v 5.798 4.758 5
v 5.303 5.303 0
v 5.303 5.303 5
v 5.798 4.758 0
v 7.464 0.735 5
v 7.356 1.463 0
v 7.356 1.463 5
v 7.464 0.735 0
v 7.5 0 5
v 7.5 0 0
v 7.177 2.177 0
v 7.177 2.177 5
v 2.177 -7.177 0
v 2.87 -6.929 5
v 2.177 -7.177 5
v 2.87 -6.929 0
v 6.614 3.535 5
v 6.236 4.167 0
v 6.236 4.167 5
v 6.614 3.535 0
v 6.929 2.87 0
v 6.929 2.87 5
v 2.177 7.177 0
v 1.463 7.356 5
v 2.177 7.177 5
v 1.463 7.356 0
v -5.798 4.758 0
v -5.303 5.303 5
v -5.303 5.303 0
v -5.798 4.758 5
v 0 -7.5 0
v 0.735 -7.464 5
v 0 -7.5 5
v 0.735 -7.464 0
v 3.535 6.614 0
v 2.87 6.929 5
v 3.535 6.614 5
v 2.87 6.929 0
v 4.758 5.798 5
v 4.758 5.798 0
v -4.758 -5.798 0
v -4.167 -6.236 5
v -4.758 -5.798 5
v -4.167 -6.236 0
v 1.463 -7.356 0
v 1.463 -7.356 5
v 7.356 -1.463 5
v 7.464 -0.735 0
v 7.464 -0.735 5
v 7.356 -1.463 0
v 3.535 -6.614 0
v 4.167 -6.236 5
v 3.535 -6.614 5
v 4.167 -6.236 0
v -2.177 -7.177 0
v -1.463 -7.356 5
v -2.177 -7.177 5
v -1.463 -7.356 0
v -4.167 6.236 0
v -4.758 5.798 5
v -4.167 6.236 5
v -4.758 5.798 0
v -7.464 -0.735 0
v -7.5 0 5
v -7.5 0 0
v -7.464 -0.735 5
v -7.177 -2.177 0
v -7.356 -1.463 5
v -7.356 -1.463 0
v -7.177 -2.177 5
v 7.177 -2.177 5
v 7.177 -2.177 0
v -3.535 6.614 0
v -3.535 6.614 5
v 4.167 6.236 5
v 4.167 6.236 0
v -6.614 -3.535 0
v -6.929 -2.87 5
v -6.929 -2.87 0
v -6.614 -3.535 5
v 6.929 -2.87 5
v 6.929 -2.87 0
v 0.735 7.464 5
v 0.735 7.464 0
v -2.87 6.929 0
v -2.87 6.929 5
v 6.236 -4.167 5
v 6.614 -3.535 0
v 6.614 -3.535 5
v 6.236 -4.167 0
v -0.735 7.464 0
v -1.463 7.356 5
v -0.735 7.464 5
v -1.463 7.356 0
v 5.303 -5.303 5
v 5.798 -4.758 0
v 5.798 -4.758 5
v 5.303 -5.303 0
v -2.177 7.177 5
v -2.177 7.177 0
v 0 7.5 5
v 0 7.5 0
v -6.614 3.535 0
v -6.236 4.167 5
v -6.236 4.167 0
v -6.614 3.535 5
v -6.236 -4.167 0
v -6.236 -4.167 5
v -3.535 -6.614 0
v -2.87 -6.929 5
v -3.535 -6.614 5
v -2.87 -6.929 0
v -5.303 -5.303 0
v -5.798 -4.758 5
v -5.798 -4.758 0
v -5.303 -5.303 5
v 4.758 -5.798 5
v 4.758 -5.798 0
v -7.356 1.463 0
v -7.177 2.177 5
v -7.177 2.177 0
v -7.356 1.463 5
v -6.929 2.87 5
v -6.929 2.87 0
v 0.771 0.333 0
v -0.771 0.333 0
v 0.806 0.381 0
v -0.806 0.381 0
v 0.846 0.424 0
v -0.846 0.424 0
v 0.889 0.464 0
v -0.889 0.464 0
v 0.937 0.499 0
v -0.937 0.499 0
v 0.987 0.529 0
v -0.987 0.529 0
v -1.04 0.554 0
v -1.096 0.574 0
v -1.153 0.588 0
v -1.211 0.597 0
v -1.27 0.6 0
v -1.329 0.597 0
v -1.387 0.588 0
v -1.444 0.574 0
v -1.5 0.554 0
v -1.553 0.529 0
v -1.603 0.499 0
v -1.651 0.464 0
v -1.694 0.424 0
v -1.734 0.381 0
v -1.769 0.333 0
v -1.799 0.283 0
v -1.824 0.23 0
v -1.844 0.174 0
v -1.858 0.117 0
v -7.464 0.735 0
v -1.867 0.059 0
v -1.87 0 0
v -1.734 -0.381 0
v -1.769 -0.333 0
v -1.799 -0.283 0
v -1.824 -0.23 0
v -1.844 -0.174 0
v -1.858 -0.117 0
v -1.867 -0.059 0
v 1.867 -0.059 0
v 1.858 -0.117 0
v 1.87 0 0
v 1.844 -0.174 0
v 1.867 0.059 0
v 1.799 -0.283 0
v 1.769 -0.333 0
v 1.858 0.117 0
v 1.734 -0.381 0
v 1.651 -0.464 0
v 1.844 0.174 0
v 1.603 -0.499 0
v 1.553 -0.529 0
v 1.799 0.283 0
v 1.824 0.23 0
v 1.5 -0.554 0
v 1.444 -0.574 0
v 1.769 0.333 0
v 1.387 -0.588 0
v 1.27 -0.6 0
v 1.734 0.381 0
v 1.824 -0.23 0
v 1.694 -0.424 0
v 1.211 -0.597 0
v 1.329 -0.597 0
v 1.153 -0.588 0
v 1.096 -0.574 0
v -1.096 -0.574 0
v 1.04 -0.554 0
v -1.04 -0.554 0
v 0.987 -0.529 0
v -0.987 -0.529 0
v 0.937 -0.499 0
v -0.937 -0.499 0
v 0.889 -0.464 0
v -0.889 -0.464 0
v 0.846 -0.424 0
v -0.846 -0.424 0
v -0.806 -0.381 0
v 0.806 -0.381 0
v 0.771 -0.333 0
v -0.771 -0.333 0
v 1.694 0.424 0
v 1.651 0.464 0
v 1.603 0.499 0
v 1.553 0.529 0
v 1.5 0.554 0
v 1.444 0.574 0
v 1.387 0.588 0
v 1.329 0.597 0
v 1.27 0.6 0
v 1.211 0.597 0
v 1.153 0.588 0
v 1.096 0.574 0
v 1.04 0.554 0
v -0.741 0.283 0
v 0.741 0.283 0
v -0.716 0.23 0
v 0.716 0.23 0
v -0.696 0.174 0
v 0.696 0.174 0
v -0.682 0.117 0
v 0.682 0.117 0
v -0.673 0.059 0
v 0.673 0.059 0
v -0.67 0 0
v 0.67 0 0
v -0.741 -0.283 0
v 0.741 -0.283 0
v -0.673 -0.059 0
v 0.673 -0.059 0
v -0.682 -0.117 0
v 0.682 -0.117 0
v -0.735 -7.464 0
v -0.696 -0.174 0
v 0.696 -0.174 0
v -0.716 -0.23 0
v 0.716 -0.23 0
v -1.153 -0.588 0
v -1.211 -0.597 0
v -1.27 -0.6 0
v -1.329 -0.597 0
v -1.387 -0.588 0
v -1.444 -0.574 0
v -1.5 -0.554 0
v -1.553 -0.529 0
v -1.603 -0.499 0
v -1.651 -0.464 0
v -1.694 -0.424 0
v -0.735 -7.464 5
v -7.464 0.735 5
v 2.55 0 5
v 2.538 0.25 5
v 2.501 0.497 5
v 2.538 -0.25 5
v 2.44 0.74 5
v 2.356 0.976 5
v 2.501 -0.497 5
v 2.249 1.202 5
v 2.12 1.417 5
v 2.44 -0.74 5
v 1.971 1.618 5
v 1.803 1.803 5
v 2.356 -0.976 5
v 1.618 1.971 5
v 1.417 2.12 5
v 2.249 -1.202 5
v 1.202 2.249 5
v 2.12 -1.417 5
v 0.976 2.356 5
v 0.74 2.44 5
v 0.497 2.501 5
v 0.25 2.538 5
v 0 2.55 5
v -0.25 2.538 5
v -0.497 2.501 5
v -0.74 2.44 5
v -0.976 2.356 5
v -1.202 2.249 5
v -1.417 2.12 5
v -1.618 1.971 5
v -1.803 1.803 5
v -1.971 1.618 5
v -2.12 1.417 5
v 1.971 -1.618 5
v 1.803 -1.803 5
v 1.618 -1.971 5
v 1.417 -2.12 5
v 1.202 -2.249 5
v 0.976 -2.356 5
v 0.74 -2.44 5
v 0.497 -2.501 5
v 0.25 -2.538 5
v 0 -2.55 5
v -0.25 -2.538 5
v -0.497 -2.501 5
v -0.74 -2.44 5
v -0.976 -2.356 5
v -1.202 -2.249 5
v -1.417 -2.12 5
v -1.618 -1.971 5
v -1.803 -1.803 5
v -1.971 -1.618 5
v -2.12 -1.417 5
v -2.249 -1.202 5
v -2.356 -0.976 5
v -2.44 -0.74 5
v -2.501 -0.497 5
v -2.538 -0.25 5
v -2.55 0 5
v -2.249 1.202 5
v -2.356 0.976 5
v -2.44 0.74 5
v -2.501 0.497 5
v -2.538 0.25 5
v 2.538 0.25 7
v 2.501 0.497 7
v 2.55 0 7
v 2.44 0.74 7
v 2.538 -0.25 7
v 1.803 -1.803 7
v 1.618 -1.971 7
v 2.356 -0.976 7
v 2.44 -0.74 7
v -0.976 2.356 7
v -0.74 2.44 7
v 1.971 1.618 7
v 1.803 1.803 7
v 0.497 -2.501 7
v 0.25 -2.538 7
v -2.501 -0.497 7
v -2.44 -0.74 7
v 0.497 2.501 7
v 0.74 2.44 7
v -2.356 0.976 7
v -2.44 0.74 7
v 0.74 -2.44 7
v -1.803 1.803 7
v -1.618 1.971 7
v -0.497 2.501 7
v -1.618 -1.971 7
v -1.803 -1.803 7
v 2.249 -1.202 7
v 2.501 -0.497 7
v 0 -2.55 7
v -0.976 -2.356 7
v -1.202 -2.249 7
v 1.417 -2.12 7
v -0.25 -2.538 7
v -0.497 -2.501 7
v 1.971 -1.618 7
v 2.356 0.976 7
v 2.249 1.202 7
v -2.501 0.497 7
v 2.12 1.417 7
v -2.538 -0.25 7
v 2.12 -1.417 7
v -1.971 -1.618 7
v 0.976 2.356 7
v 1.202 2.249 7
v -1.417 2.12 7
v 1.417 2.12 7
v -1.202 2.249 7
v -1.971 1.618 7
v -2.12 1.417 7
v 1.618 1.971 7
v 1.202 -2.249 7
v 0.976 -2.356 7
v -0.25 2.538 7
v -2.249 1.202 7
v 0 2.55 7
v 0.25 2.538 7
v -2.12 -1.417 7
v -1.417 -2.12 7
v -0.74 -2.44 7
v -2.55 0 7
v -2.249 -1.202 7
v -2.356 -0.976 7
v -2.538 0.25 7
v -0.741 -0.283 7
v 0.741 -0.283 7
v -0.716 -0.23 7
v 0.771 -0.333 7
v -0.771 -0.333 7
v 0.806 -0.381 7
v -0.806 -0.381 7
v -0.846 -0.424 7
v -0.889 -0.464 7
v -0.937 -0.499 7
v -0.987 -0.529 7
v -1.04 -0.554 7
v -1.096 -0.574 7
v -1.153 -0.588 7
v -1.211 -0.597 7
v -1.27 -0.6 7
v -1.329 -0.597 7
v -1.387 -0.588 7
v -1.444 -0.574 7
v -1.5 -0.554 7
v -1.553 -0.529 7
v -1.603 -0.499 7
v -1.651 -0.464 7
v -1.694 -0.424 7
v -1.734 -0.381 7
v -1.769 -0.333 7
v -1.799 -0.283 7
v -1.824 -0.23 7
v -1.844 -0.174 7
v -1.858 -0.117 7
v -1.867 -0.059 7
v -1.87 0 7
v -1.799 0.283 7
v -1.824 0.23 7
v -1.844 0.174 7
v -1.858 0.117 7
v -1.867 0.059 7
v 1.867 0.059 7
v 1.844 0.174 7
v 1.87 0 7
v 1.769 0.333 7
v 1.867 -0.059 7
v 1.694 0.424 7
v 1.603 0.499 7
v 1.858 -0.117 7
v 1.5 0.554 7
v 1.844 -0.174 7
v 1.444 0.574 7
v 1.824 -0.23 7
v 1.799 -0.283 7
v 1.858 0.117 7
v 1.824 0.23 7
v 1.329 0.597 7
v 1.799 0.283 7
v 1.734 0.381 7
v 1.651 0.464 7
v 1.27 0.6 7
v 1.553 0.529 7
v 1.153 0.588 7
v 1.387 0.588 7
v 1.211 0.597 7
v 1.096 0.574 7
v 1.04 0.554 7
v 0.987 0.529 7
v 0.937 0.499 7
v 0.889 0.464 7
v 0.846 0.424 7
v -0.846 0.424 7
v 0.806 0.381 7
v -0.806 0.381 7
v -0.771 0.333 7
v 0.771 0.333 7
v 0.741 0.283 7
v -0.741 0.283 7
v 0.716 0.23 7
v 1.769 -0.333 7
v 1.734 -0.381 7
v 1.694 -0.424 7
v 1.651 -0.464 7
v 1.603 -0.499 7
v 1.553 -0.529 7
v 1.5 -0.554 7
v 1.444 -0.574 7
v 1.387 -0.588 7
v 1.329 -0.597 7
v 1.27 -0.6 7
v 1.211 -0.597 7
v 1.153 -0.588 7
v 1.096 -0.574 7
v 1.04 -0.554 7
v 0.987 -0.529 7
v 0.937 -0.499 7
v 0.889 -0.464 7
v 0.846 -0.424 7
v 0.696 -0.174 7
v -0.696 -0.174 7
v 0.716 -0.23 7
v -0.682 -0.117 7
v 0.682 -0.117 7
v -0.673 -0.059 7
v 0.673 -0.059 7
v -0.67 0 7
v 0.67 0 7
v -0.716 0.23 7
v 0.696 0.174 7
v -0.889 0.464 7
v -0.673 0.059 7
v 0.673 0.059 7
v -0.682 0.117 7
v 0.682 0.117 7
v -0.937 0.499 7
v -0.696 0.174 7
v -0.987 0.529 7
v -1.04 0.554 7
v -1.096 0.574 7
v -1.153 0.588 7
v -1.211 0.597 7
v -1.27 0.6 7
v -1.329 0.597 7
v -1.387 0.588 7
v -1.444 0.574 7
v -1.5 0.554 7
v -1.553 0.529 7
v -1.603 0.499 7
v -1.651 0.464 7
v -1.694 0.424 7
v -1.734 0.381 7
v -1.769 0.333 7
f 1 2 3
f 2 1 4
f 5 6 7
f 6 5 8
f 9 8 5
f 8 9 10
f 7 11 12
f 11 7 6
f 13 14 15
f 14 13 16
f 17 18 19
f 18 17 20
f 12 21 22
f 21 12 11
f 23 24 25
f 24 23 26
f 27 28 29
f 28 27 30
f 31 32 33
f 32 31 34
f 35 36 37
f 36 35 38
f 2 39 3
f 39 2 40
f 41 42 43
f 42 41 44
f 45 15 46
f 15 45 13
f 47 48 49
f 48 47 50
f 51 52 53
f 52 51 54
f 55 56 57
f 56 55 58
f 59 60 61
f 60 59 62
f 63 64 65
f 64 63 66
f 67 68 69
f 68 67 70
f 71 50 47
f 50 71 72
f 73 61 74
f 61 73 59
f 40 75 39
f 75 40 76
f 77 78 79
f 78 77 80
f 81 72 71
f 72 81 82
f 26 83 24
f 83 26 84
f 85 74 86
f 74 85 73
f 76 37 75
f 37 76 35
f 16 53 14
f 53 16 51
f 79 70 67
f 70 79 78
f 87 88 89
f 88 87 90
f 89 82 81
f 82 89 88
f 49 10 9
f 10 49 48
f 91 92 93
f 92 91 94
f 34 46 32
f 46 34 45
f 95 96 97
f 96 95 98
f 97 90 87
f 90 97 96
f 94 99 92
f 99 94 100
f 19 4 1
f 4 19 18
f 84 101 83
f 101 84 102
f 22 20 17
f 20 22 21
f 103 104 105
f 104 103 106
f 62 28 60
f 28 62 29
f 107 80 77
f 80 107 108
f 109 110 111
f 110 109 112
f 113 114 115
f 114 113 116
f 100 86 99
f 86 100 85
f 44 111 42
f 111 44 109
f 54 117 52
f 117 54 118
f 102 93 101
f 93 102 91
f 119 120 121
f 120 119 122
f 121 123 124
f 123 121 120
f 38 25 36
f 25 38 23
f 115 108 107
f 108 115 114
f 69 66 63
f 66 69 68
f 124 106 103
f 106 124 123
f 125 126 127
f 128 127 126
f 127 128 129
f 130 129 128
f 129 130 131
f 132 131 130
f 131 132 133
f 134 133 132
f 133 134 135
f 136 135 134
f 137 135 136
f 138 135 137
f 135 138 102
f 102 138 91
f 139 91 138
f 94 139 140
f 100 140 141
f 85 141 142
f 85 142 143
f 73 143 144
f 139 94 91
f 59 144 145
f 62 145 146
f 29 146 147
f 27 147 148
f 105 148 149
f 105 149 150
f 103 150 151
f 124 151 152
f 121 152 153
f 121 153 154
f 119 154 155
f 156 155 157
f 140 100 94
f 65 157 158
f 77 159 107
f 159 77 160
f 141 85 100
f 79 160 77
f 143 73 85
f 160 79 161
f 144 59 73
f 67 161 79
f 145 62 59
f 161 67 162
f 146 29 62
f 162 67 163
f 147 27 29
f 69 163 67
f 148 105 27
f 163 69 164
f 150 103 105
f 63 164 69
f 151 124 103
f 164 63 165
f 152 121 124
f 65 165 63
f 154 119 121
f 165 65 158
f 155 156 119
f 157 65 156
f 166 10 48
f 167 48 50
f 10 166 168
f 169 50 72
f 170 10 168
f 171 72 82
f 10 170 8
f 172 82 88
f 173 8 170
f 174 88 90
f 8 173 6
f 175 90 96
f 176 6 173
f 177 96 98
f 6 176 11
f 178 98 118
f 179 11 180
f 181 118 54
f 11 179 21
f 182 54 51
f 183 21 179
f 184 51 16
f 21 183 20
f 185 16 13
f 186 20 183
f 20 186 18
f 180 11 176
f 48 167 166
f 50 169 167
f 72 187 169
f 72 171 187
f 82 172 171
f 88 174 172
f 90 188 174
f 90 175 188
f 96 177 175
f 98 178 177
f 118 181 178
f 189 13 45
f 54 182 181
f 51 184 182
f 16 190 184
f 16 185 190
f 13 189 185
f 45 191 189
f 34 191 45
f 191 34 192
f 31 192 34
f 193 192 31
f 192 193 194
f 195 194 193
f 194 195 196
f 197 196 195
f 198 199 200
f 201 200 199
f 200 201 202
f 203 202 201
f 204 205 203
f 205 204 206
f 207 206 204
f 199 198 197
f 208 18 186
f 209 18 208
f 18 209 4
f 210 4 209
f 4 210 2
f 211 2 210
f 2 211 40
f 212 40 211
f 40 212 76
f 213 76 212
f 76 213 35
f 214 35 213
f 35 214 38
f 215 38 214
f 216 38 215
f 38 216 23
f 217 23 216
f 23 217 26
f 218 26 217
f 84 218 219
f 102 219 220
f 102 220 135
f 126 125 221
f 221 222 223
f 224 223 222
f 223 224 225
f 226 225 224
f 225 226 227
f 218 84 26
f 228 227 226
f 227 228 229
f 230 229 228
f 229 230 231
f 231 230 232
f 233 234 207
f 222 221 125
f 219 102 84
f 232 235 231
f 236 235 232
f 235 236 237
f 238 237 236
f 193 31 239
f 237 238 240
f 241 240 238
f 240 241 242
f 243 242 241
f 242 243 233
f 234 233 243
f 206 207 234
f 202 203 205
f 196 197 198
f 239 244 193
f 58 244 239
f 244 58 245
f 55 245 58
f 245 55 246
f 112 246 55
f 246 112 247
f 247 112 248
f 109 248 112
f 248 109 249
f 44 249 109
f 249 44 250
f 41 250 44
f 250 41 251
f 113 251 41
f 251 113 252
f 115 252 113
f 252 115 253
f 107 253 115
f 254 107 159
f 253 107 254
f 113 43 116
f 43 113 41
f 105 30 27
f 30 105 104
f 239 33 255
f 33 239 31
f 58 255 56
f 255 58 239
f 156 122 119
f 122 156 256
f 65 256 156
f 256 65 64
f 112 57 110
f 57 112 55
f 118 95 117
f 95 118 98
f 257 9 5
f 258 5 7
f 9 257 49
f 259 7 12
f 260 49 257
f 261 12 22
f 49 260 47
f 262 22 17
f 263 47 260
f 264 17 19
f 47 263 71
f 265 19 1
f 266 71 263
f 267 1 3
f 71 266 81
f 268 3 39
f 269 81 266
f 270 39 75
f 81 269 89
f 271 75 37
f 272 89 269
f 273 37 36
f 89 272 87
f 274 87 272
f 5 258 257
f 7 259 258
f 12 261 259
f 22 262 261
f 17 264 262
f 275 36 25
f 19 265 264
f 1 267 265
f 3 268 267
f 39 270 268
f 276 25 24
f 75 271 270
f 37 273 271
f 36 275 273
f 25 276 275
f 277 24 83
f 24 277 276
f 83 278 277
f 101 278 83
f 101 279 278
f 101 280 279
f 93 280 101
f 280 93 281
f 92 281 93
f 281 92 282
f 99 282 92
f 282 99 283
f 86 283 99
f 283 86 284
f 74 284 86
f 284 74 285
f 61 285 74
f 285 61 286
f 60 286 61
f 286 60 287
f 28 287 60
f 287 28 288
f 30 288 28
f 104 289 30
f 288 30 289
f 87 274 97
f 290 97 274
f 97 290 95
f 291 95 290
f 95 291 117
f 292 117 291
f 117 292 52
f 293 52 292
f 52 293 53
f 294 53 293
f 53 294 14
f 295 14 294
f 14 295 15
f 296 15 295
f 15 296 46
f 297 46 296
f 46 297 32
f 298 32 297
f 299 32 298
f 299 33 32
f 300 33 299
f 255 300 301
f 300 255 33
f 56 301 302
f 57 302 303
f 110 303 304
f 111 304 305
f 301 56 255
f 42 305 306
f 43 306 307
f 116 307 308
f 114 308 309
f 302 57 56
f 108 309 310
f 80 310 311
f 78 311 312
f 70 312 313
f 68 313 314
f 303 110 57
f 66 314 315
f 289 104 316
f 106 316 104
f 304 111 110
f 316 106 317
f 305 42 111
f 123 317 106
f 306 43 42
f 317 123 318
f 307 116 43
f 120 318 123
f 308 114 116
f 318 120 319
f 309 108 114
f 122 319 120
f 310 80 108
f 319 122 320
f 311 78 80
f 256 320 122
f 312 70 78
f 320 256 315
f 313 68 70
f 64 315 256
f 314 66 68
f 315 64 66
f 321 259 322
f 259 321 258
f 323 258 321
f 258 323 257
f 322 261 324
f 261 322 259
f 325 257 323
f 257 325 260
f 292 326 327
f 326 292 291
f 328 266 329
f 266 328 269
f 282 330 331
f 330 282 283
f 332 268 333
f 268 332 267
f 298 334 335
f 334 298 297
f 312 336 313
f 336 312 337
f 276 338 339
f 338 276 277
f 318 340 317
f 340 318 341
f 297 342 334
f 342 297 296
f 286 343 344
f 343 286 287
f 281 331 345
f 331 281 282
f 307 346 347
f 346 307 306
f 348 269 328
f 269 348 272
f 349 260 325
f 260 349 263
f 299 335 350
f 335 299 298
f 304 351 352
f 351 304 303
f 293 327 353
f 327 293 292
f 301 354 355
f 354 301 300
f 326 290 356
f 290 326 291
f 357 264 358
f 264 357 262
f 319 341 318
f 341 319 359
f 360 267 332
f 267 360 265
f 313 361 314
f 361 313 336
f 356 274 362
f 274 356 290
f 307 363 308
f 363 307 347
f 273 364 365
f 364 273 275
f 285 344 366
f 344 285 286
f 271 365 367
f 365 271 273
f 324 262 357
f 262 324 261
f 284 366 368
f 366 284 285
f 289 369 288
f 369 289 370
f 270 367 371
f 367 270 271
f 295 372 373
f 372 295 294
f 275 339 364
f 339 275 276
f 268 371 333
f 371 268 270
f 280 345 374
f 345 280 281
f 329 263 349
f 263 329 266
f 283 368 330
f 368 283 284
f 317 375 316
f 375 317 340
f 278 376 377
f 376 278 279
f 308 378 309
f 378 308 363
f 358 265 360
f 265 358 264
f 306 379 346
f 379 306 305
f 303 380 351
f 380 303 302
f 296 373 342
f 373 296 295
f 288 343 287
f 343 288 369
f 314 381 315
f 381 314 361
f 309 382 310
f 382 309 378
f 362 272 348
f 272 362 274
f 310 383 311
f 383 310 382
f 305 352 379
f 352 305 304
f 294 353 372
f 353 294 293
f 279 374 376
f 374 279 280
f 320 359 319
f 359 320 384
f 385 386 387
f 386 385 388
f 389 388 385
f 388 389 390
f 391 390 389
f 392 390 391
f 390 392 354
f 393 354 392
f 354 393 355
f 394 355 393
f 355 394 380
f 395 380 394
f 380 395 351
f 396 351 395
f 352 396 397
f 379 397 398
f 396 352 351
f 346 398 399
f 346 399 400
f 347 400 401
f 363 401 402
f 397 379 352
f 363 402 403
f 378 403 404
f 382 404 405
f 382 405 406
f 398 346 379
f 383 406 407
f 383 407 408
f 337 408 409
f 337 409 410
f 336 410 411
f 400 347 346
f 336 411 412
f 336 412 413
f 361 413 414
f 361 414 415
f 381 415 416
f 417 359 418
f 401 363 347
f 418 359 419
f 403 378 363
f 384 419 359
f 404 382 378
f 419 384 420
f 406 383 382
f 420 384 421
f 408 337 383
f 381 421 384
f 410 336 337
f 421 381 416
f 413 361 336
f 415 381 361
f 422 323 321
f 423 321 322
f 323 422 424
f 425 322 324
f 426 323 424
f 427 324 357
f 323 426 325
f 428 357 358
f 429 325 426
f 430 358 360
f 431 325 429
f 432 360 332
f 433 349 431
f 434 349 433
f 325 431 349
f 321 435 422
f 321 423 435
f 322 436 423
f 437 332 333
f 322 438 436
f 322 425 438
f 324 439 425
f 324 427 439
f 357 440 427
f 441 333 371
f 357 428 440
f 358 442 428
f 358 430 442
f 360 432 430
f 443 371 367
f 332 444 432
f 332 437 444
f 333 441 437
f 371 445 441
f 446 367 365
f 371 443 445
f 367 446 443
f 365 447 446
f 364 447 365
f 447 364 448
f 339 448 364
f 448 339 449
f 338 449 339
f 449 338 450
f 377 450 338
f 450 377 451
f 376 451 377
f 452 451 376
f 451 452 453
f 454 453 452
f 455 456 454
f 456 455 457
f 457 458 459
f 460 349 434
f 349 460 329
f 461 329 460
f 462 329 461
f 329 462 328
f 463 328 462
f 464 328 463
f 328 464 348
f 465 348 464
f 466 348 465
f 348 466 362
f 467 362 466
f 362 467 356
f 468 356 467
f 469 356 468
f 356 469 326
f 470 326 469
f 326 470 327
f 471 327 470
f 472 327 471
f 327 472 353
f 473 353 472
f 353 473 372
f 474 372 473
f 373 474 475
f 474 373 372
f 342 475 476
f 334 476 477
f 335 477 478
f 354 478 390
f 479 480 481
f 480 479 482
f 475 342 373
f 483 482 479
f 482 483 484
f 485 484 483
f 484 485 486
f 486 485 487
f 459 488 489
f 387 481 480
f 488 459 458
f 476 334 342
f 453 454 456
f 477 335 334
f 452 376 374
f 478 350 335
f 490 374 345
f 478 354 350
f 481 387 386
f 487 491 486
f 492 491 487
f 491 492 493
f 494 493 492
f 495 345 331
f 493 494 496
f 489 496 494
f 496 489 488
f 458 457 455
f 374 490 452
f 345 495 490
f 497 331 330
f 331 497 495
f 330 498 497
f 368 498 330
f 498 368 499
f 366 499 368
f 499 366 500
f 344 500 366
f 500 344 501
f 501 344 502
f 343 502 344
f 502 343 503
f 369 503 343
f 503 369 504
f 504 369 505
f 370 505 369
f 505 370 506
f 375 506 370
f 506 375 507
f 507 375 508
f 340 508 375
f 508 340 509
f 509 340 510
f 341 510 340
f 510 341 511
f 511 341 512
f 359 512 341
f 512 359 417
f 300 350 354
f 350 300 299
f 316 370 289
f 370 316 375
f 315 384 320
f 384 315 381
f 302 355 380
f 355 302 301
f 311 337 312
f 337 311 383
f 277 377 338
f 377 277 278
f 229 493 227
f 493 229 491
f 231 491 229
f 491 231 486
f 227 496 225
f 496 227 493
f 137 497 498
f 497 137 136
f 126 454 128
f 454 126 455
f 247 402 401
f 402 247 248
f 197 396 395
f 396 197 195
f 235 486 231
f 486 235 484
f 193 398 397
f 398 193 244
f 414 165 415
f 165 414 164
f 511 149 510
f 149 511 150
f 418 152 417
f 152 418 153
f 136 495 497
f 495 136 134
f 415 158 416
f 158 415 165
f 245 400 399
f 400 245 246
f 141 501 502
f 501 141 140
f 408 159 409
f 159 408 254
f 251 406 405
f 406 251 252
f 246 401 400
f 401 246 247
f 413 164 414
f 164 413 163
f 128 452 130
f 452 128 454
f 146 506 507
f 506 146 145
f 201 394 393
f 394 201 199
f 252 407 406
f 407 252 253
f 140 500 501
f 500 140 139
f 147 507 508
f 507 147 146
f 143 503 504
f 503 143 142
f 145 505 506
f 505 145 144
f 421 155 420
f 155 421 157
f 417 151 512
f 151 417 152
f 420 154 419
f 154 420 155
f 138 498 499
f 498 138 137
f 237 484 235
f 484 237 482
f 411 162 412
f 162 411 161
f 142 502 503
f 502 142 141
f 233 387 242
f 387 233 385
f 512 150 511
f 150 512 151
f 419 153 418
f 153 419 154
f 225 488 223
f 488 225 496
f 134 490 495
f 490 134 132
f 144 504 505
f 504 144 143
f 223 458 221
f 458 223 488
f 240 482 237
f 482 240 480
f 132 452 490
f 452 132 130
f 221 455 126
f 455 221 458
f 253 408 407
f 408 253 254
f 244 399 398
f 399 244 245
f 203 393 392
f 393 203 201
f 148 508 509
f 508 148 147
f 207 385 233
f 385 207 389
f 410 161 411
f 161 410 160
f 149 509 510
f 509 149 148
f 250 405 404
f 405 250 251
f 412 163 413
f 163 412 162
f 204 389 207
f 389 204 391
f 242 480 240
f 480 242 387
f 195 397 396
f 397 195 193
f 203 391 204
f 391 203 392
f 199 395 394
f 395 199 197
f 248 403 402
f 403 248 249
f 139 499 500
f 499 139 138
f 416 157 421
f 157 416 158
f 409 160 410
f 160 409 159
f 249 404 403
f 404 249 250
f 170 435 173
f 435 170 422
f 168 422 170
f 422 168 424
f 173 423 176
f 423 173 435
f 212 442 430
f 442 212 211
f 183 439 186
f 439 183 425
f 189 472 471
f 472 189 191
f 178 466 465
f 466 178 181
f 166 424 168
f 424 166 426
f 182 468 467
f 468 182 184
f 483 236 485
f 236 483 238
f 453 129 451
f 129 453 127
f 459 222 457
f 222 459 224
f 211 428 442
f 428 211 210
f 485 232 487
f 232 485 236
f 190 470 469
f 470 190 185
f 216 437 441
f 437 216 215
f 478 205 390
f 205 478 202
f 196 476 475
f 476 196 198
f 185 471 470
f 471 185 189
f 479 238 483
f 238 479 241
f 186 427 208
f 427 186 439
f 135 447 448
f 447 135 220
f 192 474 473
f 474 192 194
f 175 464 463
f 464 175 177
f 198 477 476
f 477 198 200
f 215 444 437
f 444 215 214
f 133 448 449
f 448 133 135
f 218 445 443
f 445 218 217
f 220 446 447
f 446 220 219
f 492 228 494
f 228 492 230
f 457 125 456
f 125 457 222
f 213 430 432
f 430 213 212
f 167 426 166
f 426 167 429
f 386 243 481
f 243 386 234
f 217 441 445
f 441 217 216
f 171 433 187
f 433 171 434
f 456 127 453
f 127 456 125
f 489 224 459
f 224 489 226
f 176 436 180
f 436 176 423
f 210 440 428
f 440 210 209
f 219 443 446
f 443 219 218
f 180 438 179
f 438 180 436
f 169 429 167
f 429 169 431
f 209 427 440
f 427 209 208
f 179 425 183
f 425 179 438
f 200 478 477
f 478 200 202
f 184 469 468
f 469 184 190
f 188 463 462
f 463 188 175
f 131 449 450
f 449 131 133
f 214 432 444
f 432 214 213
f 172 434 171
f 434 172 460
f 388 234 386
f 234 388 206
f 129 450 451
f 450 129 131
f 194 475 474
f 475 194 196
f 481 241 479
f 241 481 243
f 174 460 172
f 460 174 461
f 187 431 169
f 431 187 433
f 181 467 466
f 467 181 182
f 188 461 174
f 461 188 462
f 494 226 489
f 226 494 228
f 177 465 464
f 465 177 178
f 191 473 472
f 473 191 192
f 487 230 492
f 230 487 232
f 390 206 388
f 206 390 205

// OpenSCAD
// file: params.scad
// ============================================
// fiberfeel-rig 共通パラメータ
// ============================================

// --- ファイバー ---
// 三菱レイヨン エスカ CK-40E1 (PMMA SI POF, 1.0mm OD)
pof_diameter_mm = 1.0;
pof_clearance_mm = 0.2;                       // 印刷誤差吸収
pof_channel_width_mm = pof_diameter_mm + pof_clearance_mm;
pof_channel_depth_mm = pof_diameter_mm * 0.7; // 上面はゲル接触可能に

// --- LED カプラ専用：縦穴の収縮余裕 ---
pof_channel_width_led_side_mm = 1.8;  // 縦穴専用、収縮余裕大（実機検証で 1.5 → 1.8 に拡大）

// --- 曲げ半径 ---
bend_radius_mm = 10.0;
bend_straight_run_mm = 30;                    // 曲げ部前後の直線部長さ

// --- LED ---
led_diameter_mm = 5.1;                        // 5mm砲弾型 + クリアランス
led_body_depth_mm = 8.0;                      // LED本体（リード除く）の埋め込み深さ
led_lead_clearance_mm = 5.0;                  // リード逃げの空間

// --- LED back cap（led_fiber_coupler の LED 側穴を密閉する遮光蓋）---
led_back_cap_diameter_mm           = 15.0;    // led_fiber_coupler 外径と同じ
led_back_cap_thickness_mm          = 5.0;     // 円盤厚
led_back_cap_lead_hole_diameter_mm = 1.2;     // LED リード線通し穴
led_back_cap_lead_hole_pitch_mm    = 2.54;    // 標準 0.1" ピッチ
led_back_cap_press_fit_diameter_mm = 5.1;     // led_fiber_coupler の LED 穴と同径
led_back_cap_press_fit_depth_mm    = 2.0;     // 圧入突起の高さ

// --- ゲル/PDMS パッド ---
pad_size_mm = 30;                             // 30 x 30 mm
pad_thickness_mm = 3;                         // 3 mm 厚
mold_wall_mm = 4;
mold_floor_mm = 3;
mold_taper_deg = 1;                           // 抜き勾配

// --- 錘ガイド ---
weight_pad_outer_mm = 35;
weight_recess_diameter_mm = 25;
weight_recess_depth_mm = 5;

// --- カメラカプラ ---
// Pi HQ Camera M12 ボディ寸法
hq_body_width_mm = 38;
hq_body_height_mm = 38;
hq_body_depth_mm = 19;
camera_to_fiber_distance_mm = 70;             // 暫定、Phase 0 で調整
fiber_arm_slot_length_mm = 40;                // ±20mm の調整代

// --- HQ Camera 取り付け穴 ---
// Robosheep 実機合わせ：30×30mm 正方ピッチ、M2.5 通し穴 d=3.1（印刷収縮余裕込み）
hq_mount_pitch_mm = 30.0;       // M2.5 穴の縦・横ピッチ（実測値）
hq_mount_hole_d_mm = 3.1;       // M2.5 通し穴径（クリアランス＋印刷収縮余裕込み）
hq_mount_offset_mm = 6.25;      // PCB エッジから穴中心

// --- 遮光ボックス ---
enclosure_outer_x_mm = 180;
enclosure_outer_y_mm = 180;
enclosure_outer_z_mm = 100;
enclosure_wall_mm = 1.6;          // 壁厚（4 perimeters @ 0.4mm nozzle）
enclosure_floor_mm = 2.0;         // 底厚
enclosure_lid_thickness_mm = 2.0; // 蓋の厚さ
enclosure_lid_lip_mm = 5.0;       // 蓋の被せ深さ
enclosure_lid_clearance_mm = 0.3; // 蓋と本体の遊び

// ケーブル通し穴（迷光対策で L 字パス）
cable_pass_diameter_mm = 12;      // ケーブル束を通す穴径
cable_pass_count = 2;             // 必要な穴数（FFC + 電源）

// --- 共通 ---
default_wall_mm = 2.0;
$fn = 60;
// main file
// ============================================
// led_back_cap.scad
// LED 砲弾の根元（リード側）を密閉する遮光蓋。
// led_fiber_coupler の LED 挿入穴（z=0 端面）に底面側から圧入し、
// LED の側方／後方放射が coupler 底面から漏れるのを止める。
// 軸方向：圧入突起 = +Z 方向。
// 印刷向き：円盤を build plate に密着、突起を上向き。サポート不要。
// 推奨：黒 PETG / 黒 PLA、infill 50% 以上（光漏れ防止）。
// ============================================

include <params.scad>

$fn = 64;

module led_back_cap() {
    difference() {
        union() {
            // ベース円盤（外径 = led_fiber_coupler 外径）
            cylinder(
                d = led_back_cap_diameter_mm,
                h = led_back_cap_thickness_mm
            );
            // 圧入用突起（led_fiber_coupler の LED 穴に嵌める）
            translate([0, 0, led_back_cap_thickness_mm])
                cylinder(
                    d = led_back_cap_press_fit_diameter_mm,
                    h = led_back_cap_press_fit_depth_mm
                );
        }

        // LED リード線通し穴 ×2（標準 0.1" ピッチ = 2.54mm）
        for (x = [-led_back_cap_lead_hole_pitch_mm / 2,
                   led_back_cap_lead_hole_pitch_mm / 2]) {
            translate([x, 0, -0.5])
                cylinder(
                    d = led_back_cap_lead_hole_diameter_mm,
                    h = led_back_cap_thickness_mm
                        + led_back_cap_press_fit_depth_mm + 1
                );
        }
    }
}

led_back_cap();
